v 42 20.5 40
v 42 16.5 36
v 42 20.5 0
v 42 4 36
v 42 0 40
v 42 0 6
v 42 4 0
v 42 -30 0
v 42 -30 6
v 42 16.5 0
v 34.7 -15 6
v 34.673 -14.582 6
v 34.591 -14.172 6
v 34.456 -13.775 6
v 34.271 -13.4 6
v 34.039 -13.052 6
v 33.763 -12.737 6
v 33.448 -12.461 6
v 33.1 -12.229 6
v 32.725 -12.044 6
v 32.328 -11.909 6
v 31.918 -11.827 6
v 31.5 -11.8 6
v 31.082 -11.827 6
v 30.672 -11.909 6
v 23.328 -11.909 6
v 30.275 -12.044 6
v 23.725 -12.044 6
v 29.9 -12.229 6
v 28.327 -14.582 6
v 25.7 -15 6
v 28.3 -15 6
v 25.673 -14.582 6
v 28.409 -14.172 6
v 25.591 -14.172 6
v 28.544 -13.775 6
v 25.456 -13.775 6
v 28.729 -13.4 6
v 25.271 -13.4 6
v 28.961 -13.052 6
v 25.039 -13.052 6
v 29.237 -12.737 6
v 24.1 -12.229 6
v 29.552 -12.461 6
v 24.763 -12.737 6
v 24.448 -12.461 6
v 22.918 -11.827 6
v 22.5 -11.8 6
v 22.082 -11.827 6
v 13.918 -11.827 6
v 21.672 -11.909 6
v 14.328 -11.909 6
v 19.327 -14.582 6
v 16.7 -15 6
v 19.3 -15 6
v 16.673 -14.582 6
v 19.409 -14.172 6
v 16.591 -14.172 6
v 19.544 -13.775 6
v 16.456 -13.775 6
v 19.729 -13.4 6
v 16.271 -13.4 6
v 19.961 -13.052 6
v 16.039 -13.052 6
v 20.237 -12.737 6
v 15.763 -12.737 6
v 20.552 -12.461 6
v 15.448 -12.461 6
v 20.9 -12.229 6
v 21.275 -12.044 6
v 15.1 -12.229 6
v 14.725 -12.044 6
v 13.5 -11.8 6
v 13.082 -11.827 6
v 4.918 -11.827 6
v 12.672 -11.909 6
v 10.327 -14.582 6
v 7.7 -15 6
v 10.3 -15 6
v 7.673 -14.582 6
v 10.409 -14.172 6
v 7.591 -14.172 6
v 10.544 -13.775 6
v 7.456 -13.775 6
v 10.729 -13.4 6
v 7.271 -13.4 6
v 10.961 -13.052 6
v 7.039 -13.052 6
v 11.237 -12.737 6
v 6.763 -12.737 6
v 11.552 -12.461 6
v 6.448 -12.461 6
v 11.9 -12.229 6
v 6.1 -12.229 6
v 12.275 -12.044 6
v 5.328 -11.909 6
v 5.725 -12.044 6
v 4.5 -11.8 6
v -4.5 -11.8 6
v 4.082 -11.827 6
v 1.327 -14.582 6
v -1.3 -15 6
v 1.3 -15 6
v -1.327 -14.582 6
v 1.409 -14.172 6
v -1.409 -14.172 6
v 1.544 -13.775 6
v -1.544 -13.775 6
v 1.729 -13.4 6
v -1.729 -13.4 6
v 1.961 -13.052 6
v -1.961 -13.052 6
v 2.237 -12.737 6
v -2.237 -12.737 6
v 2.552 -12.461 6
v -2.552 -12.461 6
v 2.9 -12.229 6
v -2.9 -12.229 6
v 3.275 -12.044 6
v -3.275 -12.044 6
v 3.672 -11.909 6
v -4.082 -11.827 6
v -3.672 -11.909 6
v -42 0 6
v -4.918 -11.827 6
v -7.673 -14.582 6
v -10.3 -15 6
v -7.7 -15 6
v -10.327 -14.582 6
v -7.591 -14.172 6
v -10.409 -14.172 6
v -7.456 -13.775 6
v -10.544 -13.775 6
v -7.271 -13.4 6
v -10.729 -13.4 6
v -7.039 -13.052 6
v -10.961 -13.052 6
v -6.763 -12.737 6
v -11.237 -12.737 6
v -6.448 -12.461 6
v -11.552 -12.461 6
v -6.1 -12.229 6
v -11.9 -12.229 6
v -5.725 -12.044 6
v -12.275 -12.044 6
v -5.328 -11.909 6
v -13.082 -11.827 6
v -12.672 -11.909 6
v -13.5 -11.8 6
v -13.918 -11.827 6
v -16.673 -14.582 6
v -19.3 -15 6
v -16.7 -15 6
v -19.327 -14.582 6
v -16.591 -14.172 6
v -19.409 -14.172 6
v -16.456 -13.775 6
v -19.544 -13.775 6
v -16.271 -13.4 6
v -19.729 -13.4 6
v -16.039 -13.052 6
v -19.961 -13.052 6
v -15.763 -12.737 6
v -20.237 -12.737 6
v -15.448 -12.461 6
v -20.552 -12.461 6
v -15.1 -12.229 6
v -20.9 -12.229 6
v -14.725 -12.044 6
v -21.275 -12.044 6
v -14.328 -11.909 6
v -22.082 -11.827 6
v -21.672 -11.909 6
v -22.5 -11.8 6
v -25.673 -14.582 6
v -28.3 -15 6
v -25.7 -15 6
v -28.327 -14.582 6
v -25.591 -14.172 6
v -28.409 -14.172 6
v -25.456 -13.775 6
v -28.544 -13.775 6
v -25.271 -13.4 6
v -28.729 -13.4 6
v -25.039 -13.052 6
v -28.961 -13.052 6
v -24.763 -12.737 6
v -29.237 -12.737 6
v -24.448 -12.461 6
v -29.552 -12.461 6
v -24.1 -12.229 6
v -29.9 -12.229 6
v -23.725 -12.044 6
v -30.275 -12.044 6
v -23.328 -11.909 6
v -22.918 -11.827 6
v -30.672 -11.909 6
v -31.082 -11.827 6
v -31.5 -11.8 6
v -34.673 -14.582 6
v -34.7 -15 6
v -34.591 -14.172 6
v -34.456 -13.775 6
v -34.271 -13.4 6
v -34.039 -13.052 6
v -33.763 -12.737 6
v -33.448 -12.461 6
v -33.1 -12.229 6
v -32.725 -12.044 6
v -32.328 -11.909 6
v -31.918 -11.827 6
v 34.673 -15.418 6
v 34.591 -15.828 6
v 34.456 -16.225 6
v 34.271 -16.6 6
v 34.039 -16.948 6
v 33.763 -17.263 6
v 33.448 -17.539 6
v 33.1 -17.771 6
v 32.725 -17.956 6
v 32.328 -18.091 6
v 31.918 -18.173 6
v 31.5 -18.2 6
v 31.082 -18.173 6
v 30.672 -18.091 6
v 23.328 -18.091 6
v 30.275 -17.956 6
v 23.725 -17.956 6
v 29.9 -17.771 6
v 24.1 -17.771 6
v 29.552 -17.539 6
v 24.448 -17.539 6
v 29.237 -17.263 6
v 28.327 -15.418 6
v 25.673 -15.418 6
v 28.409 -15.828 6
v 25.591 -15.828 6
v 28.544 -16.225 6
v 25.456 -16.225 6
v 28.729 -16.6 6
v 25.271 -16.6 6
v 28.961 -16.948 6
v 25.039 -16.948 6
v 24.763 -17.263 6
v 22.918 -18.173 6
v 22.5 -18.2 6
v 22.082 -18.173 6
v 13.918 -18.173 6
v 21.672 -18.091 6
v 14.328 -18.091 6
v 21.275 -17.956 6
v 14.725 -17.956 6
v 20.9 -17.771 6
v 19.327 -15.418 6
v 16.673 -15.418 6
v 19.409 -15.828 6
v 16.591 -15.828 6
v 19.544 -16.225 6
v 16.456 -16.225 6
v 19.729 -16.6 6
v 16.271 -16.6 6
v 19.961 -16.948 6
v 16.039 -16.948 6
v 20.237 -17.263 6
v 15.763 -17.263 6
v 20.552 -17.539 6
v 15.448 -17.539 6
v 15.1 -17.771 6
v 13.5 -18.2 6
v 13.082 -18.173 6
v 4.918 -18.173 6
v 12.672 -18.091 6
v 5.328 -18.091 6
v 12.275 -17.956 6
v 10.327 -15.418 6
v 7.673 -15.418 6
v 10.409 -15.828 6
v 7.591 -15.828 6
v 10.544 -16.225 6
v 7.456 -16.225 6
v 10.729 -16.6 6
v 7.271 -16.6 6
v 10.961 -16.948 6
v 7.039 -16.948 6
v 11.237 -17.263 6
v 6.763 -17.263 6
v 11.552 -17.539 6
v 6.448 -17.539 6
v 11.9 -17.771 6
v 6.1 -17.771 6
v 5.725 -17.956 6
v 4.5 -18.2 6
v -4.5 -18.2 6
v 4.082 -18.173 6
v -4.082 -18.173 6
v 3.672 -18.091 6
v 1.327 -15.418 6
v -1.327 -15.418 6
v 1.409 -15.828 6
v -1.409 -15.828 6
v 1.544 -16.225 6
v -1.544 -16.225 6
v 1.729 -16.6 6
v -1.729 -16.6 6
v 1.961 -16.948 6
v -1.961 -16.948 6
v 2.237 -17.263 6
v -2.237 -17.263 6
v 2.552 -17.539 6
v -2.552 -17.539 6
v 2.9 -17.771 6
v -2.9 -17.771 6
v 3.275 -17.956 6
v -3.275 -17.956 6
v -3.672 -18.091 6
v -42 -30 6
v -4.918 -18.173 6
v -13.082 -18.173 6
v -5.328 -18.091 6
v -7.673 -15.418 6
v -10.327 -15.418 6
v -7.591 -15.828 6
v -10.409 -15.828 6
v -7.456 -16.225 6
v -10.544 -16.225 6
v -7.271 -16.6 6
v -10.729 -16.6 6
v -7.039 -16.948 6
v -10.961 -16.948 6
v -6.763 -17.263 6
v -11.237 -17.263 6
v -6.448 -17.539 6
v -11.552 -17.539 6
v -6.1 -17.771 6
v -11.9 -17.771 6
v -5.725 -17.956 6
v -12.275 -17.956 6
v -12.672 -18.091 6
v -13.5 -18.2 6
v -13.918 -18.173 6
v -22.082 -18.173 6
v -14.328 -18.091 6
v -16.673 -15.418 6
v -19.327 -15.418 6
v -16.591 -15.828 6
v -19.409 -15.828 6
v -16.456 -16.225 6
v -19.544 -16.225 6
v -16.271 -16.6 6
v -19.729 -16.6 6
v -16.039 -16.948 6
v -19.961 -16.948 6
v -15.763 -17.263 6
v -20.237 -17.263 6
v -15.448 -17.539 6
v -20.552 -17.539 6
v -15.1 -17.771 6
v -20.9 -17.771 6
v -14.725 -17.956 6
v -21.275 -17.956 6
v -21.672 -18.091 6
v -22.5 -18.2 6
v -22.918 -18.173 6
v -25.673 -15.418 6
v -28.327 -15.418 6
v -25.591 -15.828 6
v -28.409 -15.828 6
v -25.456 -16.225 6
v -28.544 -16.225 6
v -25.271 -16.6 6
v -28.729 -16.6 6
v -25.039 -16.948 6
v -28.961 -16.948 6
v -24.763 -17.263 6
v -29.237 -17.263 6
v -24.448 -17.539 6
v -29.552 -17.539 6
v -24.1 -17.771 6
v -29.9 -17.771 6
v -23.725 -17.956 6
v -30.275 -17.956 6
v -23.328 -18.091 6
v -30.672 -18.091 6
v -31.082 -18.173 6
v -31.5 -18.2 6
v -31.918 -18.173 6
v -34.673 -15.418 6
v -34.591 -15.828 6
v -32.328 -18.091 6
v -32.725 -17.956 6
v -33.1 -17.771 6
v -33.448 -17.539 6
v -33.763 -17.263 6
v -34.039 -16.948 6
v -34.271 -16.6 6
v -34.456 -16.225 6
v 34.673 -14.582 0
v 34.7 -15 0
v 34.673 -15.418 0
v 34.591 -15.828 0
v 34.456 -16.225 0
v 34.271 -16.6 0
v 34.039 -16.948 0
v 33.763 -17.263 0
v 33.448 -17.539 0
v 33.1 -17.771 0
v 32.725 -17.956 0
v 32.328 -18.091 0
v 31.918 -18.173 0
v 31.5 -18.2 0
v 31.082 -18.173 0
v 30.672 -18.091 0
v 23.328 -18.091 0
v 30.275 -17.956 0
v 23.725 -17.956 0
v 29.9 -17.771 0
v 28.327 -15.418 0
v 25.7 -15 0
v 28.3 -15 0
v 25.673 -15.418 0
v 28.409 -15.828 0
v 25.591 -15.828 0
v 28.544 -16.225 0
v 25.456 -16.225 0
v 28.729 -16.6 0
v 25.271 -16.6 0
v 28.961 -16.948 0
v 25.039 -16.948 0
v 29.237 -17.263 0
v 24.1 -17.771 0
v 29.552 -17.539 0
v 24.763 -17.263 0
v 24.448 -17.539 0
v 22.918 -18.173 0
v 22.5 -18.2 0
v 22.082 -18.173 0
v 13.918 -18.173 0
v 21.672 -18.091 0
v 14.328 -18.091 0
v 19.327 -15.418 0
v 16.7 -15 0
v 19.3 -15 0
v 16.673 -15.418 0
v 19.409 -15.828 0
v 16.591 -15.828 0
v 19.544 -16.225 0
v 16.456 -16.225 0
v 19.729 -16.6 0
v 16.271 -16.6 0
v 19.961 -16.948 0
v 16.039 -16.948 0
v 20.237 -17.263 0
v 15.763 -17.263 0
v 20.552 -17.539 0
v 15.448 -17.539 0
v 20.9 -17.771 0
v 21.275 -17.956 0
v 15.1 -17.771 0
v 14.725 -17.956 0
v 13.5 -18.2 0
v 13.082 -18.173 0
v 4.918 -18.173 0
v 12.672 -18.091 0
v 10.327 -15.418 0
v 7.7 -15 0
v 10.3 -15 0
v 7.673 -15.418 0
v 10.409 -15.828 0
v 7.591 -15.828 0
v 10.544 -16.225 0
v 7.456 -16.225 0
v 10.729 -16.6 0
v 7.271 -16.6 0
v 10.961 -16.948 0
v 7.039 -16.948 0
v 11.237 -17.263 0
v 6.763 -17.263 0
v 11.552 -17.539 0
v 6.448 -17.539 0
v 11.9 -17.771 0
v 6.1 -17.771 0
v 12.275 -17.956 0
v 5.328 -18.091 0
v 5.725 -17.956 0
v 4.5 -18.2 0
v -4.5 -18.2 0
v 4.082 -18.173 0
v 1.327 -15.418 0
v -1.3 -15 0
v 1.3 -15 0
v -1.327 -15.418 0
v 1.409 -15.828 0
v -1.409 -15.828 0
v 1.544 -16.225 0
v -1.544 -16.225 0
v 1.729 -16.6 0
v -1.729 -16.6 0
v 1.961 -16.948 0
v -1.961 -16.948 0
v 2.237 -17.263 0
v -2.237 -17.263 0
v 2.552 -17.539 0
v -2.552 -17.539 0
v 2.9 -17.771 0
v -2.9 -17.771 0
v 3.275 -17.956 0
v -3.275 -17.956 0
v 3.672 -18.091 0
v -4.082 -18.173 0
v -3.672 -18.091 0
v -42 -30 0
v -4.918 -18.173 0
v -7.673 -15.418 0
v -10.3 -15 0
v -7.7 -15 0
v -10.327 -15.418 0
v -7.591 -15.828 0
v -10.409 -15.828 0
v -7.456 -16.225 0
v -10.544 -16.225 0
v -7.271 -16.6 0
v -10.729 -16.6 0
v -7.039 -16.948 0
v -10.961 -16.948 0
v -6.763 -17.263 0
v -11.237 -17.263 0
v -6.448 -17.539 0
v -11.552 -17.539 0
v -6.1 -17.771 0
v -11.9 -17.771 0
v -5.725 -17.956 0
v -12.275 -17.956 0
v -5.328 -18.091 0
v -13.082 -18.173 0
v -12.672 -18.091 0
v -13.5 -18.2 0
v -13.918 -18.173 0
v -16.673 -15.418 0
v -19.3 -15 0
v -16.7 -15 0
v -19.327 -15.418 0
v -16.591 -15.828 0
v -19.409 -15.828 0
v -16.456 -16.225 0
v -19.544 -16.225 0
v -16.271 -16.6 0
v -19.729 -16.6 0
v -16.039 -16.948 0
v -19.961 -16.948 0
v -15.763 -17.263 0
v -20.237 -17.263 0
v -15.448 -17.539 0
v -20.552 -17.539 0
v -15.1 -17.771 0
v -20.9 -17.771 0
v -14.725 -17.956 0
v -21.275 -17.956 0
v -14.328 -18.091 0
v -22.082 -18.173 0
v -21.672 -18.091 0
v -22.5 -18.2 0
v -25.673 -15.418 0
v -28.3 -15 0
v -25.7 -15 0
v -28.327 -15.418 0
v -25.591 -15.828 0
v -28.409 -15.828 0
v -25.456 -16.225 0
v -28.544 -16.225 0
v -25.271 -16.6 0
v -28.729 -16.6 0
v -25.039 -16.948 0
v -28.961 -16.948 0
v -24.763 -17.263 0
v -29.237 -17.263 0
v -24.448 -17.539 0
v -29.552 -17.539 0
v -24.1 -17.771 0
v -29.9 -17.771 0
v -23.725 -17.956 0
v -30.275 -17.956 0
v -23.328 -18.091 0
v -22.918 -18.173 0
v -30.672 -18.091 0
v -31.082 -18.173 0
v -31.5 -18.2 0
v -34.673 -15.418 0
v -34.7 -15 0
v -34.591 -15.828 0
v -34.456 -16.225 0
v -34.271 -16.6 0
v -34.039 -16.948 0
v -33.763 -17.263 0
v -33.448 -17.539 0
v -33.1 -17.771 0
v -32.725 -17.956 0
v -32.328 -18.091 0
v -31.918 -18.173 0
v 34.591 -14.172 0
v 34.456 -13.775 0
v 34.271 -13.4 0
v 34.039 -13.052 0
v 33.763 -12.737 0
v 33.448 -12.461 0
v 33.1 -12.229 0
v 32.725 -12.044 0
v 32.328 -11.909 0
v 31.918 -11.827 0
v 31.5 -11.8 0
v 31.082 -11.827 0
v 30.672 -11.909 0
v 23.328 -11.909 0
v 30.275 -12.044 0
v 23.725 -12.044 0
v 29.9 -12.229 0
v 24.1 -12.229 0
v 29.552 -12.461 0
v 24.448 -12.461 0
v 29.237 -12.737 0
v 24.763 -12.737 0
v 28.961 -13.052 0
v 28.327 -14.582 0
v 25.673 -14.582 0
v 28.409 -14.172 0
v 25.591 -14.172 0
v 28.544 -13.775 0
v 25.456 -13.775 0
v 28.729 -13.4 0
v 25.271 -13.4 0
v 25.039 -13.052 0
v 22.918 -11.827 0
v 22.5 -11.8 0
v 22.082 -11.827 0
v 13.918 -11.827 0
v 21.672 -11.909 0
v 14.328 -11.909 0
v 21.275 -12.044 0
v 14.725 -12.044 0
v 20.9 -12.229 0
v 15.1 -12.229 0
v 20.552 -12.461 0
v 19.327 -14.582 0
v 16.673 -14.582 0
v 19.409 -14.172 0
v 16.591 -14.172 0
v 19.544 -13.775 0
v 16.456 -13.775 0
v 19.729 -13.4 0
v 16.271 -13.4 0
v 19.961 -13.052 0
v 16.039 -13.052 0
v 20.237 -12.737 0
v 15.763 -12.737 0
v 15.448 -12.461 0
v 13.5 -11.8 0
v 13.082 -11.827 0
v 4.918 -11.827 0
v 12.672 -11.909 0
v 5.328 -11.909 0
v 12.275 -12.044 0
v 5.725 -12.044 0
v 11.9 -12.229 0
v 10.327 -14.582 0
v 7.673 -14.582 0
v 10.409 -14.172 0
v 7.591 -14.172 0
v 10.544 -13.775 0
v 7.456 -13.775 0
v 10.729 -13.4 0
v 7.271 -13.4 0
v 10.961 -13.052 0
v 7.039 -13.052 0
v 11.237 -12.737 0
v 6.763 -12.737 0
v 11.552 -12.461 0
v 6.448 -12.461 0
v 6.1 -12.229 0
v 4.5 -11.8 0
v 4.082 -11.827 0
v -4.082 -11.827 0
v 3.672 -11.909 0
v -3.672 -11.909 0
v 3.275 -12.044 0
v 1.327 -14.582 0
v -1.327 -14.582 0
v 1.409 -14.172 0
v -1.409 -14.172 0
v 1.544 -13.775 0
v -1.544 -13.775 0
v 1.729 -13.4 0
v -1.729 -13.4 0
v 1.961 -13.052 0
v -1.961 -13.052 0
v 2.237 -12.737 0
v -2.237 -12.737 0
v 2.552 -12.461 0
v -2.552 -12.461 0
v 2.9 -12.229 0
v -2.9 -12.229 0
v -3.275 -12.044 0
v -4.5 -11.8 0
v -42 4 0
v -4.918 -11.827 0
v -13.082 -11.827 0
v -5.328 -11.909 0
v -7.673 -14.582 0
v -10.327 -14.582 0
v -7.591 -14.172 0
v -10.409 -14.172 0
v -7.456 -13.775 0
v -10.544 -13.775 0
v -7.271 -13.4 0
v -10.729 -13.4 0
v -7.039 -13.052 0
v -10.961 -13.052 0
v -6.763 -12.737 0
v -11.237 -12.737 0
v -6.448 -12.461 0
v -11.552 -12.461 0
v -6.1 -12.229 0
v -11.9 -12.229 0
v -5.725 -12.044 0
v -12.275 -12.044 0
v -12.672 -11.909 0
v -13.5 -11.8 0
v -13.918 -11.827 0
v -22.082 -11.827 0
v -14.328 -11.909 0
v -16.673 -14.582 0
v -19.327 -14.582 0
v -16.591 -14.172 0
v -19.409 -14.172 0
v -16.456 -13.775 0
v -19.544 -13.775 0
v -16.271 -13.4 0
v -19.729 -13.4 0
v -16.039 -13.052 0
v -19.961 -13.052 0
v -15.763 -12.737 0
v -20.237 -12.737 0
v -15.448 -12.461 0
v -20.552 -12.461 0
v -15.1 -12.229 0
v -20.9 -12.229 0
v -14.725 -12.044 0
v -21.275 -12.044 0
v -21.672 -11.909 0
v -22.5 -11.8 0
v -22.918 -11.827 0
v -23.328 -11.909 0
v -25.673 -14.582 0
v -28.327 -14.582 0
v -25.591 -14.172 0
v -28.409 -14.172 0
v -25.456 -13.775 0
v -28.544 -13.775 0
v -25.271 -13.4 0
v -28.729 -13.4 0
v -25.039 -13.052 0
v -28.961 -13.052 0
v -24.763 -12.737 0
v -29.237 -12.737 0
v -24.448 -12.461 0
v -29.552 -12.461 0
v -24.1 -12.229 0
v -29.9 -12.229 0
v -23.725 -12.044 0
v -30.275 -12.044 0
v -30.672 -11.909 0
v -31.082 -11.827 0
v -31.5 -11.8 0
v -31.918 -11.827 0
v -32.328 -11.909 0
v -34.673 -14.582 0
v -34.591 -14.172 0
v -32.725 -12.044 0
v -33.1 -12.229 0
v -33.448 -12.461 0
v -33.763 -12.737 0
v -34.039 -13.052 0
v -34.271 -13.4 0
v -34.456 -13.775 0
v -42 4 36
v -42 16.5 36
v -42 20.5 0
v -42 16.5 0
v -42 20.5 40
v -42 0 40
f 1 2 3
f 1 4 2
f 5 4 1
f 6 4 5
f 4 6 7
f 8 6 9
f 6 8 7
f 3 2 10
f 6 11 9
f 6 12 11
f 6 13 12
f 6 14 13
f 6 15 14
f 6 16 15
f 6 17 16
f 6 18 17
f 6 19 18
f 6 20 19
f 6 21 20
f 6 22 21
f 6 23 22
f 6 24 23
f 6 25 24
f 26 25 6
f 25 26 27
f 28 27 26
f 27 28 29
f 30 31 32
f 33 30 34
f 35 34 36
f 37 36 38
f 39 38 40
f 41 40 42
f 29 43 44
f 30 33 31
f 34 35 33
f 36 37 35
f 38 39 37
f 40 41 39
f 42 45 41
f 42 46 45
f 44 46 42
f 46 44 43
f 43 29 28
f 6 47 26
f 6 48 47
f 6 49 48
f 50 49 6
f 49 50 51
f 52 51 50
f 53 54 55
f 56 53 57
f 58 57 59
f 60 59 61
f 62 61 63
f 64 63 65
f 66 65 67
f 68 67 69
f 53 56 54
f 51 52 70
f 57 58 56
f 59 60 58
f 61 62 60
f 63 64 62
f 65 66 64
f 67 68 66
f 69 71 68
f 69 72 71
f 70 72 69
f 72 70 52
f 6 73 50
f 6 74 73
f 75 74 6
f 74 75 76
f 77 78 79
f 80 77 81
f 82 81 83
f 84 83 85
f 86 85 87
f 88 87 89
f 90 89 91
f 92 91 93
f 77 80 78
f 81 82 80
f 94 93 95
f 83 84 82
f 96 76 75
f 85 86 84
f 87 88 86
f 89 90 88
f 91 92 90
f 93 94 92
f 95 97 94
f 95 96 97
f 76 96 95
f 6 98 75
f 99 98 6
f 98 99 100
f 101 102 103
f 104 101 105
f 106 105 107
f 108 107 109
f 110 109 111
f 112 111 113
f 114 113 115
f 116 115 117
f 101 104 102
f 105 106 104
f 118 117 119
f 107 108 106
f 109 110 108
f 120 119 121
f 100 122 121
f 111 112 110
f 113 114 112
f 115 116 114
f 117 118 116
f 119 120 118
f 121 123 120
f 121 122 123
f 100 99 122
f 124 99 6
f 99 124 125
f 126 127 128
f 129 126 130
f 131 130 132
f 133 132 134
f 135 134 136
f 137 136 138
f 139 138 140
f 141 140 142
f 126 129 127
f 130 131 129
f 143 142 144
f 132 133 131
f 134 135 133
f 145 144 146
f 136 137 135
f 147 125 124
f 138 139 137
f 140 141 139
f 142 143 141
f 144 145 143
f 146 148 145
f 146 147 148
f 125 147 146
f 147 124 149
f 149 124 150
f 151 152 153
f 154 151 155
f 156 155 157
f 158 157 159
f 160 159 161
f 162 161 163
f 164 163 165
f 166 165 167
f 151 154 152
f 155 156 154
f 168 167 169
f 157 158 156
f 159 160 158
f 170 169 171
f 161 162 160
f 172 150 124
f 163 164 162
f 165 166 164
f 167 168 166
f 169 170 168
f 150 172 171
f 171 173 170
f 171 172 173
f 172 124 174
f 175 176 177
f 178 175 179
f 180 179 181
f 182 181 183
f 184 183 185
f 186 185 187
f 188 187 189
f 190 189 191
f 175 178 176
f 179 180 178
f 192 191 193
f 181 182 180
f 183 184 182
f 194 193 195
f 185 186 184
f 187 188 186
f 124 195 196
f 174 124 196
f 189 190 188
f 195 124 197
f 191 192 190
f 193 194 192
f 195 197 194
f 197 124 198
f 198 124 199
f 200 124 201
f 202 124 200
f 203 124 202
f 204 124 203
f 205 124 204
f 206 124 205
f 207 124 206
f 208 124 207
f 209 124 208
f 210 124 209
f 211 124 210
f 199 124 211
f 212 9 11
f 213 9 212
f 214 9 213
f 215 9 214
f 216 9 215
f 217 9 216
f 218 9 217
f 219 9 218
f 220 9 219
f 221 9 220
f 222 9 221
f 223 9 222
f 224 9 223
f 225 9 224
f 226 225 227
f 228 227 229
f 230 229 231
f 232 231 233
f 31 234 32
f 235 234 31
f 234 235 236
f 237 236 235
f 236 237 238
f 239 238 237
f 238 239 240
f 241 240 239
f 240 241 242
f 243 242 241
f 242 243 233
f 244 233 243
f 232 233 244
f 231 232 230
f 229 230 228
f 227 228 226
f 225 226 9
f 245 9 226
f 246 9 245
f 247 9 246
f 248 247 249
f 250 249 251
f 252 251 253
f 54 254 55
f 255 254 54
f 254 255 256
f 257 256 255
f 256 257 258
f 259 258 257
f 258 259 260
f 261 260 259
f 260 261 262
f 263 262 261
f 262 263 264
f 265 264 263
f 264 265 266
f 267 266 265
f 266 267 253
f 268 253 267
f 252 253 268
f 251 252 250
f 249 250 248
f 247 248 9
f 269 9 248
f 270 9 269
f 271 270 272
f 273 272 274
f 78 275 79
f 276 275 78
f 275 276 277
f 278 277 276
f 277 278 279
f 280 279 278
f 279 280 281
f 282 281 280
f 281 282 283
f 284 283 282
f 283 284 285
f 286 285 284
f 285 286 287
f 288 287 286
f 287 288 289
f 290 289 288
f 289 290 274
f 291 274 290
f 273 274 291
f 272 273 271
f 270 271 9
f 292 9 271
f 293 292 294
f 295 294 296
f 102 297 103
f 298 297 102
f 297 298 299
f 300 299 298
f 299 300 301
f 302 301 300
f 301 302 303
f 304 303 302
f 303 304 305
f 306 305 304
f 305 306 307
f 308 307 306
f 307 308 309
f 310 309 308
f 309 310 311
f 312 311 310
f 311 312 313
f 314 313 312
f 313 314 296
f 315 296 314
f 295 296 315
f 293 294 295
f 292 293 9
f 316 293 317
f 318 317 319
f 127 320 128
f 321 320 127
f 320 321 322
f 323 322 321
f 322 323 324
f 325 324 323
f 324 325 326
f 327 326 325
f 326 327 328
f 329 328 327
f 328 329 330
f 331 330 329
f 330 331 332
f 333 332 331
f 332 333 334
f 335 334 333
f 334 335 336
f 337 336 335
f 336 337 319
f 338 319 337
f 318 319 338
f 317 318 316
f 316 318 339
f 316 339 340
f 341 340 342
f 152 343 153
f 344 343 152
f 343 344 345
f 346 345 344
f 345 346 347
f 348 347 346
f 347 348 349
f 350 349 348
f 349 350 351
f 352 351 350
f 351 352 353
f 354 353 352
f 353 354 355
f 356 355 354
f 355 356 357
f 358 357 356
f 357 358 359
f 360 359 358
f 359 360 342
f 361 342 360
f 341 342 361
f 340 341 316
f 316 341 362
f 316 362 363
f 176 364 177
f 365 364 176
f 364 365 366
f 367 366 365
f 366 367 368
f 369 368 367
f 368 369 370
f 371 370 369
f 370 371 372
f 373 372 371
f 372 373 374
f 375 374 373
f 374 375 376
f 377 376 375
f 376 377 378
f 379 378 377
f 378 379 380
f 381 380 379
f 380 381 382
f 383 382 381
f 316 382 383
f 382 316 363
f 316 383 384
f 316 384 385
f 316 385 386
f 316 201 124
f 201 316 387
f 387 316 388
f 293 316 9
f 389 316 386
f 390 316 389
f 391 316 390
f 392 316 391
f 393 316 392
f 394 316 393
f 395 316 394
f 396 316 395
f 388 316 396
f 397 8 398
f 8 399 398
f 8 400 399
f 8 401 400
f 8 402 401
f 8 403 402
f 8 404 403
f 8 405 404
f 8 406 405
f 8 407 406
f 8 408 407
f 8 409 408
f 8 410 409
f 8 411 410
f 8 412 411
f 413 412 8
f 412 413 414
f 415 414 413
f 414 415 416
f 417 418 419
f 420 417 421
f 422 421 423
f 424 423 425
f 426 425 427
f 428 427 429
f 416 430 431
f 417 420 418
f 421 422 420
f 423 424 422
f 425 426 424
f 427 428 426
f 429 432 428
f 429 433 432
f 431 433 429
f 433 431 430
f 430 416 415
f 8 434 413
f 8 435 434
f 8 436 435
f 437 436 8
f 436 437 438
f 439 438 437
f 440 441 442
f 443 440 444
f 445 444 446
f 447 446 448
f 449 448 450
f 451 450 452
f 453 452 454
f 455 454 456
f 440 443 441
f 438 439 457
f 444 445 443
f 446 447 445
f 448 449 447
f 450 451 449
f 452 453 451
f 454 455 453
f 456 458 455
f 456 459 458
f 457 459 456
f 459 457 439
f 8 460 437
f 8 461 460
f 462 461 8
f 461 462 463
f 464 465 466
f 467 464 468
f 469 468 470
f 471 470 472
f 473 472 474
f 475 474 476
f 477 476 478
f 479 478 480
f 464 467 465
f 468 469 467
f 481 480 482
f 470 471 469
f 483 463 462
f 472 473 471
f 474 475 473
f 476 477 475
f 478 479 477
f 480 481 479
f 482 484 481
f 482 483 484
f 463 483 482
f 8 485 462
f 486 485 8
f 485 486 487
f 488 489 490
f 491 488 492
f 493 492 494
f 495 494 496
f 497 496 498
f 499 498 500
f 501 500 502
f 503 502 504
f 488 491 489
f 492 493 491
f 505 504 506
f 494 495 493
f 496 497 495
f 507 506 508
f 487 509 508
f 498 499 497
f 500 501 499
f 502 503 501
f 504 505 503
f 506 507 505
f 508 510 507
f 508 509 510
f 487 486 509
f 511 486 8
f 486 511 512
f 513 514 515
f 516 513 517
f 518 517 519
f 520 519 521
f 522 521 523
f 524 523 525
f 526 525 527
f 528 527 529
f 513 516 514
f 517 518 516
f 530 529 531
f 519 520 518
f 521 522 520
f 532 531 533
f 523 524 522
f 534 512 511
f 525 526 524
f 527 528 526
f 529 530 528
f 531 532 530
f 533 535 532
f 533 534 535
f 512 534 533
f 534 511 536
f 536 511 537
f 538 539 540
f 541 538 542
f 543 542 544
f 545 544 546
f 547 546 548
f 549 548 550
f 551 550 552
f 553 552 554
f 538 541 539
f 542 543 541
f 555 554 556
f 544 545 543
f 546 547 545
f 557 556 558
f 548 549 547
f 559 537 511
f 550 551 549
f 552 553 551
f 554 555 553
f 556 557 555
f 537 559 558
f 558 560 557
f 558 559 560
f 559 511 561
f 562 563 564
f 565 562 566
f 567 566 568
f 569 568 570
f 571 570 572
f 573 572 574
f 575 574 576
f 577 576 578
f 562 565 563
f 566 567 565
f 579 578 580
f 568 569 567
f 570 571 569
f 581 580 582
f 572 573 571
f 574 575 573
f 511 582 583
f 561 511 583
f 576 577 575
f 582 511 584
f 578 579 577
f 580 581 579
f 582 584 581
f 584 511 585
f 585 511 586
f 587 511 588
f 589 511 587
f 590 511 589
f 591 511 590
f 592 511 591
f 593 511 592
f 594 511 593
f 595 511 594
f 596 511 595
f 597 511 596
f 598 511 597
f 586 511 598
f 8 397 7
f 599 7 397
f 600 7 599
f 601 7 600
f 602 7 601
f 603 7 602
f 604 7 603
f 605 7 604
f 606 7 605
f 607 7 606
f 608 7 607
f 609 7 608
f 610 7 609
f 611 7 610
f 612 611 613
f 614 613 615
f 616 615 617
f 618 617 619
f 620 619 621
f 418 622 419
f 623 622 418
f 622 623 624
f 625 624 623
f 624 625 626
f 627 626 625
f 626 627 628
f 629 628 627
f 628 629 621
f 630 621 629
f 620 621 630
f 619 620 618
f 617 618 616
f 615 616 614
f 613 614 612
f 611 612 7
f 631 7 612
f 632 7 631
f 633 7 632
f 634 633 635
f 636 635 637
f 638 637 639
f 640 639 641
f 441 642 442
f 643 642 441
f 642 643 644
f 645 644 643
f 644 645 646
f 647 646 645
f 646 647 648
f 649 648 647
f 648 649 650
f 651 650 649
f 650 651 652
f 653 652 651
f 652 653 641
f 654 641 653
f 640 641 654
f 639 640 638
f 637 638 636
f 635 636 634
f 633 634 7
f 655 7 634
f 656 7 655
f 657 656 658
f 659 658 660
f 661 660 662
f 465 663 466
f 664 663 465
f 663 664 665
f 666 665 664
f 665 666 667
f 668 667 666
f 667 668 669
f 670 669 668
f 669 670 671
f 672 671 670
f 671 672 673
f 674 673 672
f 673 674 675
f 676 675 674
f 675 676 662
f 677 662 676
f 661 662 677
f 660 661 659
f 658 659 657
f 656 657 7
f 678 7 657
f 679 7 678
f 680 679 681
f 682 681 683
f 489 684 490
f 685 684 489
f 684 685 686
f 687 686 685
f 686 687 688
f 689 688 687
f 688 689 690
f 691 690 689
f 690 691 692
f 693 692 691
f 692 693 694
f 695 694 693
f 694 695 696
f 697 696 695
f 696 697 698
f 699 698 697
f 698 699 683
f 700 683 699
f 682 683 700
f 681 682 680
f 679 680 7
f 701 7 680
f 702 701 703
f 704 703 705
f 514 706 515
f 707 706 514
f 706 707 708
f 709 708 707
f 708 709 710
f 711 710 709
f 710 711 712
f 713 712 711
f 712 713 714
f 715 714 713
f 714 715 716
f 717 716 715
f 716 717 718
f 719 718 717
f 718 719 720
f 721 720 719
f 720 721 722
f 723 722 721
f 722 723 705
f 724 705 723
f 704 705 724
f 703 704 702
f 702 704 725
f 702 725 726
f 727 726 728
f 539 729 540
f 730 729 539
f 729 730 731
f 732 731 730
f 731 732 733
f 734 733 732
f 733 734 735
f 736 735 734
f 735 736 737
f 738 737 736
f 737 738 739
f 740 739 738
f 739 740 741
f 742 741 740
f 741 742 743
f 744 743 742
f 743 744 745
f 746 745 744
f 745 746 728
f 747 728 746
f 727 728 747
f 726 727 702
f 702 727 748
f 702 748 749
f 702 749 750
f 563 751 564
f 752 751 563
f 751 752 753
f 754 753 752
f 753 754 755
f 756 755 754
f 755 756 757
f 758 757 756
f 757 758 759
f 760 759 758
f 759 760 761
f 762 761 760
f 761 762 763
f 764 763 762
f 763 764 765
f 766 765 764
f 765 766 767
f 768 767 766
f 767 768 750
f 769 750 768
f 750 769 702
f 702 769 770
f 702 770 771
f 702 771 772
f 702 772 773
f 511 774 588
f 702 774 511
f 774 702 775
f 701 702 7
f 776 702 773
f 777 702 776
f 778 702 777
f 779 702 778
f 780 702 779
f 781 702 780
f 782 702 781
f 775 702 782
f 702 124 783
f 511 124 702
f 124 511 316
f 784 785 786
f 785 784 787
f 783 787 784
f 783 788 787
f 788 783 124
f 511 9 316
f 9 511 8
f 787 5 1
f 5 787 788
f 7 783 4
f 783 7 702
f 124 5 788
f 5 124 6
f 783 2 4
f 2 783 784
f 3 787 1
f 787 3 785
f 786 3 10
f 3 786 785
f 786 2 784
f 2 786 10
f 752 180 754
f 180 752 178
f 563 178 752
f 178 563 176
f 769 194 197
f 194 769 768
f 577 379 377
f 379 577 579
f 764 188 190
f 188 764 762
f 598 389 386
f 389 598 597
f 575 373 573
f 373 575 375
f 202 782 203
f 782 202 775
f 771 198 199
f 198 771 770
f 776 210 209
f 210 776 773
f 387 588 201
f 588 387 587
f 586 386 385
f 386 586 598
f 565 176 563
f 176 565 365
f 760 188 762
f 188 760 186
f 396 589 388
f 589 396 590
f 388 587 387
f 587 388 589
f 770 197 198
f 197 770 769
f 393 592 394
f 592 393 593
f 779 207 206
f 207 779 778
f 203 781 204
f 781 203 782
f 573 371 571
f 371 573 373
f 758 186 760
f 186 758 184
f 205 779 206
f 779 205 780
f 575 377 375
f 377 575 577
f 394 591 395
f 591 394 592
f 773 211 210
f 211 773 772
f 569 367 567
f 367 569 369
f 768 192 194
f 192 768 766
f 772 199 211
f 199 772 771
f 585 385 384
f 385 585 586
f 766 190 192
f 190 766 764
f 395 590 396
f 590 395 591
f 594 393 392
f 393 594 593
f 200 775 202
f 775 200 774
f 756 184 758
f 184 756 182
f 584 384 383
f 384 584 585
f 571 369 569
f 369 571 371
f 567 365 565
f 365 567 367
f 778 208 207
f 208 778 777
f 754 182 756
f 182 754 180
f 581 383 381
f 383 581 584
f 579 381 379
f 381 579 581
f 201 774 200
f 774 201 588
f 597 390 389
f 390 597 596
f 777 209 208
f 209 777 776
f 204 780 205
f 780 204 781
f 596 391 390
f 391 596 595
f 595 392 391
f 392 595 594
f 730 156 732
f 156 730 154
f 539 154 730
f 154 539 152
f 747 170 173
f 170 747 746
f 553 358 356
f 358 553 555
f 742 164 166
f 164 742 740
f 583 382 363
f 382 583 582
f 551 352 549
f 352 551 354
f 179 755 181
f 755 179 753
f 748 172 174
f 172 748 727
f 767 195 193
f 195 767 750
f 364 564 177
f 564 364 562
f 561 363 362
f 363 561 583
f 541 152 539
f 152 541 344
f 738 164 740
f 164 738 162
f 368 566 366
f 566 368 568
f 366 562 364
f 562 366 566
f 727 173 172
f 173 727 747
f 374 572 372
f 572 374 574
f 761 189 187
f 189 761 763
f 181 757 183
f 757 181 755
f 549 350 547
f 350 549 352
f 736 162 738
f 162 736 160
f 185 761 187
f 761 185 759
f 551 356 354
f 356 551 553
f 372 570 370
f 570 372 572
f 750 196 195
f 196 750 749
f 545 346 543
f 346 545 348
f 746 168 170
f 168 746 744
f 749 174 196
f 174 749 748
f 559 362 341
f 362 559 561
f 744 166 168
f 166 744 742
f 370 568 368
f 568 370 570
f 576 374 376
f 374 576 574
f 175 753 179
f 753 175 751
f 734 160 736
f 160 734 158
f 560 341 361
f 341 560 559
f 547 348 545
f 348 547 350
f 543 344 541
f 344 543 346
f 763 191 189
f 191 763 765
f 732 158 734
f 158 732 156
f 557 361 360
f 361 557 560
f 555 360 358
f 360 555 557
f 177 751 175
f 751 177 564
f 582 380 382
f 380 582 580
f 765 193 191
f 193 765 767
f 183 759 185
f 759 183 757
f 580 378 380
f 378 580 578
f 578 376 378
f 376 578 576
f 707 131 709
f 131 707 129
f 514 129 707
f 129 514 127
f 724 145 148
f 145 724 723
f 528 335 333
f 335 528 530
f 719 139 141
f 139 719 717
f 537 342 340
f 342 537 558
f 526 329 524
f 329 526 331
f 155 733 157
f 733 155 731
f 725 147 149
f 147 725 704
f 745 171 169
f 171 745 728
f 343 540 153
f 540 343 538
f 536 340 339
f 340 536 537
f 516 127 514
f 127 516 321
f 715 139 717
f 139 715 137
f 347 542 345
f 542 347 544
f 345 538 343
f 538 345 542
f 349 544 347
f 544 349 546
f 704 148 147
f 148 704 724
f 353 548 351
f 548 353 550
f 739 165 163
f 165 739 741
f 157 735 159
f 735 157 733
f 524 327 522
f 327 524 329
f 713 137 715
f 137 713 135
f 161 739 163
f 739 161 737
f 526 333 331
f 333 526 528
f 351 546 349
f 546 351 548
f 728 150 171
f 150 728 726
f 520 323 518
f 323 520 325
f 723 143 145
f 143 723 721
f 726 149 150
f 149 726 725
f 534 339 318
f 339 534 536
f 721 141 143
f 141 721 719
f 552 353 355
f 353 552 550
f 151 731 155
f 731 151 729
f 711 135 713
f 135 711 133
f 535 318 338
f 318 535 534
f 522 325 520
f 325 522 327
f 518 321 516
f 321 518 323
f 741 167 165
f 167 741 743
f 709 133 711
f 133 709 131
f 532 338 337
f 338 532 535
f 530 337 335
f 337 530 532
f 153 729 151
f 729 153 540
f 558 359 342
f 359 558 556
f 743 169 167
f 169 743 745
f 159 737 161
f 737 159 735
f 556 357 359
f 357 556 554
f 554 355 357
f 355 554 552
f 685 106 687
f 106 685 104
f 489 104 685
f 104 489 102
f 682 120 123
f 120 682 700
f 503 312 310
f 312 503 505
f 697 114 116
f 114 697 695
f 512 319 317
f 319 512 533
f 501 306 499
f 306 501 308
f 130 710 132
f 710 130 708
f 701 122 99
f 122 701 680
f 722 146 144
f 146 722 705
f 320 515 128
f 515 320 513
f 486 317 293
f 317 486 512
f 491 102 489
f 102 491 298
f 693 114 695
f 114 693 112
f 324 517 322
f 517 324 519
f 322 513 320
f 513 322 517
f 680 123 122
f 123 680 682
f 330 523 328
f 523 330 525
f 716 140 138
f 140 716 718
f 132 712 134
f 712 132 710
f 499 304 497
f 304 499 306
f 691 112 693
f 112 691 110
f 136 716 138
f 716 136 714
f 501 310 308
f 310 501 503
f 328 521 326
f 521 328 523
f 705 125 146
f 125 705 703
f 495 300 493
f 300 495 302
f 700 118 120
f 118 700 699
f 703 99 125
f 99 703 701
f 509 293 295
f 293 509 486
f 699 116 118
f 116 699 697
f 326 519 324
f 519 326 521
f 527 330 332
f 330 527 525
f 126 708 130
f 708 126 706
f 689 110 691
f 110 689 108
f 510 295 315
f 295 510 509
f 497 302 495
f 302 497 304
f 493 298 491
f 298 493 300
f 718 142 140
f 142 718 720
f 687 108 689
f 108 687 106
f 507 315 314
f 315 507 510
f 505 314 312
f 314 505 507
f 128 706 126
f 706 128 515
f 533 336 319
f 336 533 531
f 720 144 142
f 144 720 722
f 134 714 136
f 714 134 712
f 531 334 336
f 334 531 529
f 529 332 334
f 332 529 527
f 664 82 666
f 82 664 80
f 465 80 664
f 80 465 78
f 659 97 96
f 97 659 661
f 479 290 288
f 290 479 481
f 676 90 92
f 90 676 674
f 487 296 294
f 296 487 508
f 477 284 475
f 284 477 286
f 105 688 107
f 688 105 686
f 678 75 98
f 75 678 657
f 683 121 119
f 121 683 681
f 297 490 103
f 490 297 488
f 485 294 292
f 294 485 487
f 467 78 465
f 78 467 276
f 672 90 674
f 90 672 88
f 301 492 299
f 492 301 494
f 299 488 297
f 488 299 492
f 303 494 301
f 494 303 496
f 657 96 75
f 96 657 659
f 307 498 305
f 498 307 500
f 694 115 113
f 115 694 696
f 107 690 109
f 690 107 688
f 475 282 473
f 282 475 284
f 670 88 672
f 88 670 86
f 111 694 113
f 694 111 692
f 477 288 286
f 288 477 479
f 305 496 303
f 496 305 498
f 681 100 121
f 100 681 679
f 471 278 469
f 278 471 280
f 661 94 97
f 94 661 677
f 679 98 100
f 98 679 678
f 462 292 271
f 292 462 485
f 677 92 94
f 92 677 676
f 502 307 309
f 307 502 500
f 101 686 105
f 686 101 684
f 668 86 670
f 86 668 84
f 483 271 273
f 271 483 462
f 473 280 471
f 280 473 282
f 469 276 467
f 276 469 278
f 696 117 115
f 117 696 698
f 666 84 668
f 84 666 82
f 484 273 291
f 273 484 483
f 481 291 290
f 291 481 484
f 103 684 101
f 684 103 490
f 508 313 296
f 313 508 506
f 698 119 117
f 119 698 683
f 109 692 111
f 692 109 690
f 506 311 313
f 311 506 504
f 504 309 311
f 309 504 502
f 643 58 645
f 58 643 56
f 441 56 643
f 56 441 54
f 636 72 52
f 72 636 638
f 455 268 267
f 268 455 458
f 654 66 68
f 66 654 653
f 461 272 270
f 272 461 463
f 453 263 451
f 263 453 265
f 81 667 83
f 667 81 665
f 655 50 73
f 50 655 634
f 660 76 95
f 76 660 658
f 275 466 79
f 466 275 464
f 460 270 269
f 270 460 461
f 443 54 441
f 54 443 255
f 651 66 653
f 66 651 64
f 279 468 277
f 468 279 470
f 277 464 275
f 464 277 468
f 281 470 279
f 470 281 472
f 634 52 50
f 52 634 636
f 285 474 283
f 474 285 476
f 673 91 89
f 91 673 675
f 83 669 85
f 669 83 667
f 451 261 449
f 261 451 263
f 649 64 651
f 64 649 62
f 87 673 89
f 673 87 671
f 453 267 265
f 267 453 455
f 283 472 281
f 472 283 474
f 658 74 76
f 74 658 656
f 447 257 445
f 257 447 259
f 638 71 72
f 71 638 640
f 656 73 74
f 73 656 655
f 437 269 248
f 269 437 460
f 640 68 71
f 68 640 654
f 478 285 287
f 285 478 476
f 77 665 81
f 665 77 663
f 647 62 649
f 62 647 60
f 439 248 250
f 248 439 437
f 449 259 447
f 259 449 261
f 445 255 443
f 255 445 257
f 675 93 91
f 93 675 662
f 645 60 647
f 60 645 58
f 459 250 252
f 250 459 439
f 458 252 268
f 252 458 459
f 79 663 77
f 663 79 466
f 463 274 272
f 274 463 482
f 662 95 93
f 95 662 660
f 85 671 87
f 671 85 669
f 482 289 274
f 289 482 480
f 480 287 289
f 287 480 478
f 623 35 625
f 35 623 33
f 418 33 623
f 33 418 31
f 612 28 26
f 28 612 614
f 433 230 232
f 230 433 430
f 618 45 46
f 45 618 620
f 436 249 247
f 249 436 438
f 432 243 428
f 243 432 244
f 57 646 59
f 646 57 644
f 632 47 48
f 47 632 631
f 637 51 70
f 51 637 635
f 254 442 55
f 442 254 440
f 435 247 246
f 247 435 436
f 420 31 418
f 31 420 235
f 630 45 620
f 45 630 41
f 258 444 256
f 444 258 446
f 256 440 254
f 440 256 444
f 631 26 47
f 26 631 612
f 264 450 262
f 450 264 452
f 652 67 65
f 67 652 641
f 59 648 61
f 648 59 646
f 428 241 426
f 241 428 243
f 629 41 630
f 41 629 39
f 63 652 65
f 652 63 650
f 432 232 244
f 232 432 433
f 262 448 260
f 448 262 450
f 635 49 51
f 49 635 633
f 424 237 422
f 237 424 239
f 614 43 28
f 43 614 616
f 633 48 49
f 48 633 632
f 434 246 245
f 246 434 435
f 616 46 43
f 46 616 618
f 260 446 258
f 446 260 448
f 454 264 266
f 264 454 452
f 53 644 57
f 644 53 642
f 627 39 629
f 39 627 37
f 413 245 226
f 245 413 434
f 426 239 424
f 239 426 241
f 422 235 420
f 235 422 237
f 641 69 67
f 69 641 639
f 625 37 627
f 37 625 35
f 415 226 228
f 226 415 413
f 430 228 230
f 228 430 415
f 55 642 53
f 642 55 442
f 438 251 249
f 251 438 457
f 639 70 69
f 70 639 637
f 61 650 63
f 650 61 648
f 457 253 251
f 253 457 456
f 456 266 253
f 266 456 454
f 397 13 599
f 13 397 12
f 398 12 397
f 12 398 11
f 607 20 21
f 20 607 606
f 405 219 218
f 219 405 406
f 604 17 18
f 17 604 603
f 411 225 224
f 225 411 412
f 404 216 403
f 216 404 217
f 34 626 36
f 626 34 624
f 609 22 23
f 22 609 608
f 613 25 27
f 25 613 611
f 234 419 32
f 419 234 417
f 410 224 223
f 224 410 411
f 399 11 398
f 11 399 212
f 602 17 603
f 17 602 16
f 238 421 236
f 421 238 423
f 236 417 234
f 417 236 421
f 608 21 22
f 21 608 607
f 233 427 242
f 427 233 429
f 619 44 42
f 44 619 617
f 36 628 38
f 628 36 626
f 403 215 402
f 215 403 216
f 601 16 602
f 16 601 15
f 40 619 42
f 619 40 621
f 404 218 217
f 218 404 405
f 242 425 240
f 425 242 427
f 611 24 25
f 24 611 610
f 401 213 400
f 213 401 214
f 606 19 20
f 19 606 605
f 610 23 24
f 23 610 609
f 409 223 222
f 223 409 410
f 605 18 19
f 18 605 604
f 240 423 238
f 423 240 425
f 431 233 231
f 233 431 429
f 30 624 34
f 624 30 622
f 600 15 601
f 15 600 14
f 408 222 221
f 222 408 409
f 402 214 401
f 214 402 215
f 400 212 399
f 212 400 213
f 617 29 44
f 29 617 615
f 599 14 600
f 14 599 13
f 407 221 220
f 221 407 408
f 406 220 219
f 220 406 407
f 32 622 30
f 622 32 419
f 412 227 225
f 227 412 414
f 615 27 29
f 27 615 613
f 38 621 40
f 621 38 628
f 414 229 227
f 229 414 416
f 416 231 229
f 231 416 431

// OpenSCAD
// KNOWN-WRONG PART (must fail): the legs are 40 mm tall instead of 50
// Holder that hangs one 8-tube PCR strip inside an ice bucket, hooked over its 12 mm wall
// Category: quick fixes. An upside-down U (two legs and a bridge) that fits over the wall, and a
// ledge at the foot of the inner leg with eight tube holes, so the tubes sit down in the ice.
// Print: PLA or PETG, as used (both legs and the ledge on the bed); the bridge spans 12.5 mm.
// SPDX-License-Identifier: CERN-OHL-P-2.0

/* [Hanger] */
length = 84;              // along X, centred
leg_t = 4;
gap = 12.5;               // 12 mm bucket wall + clearance
leg_h = 40;               // both legs from z = 0 to 50
bridge_t = 4;             // bridge from z = 46 to 50
ledge = [30, 6];          // ledge reaches 30 mm toward -Y, 6 mm thick
hole_d = 6.4;
n = 8;
pitch = 9;
hole_y = -15;

/* [Hidden] */
eps = 0.01;
outer_y = leg_t + gap;    // outer leg from y = 16.5 to 20.5

difference() {
    union() {
        translate([-length / 2, -ledge[0], 0]) cube([length, ledge[0] + eps, ledge[1]]);
        translate([-length / 2, 0, 0]) cube([length, leg_t, leg_h]);
        translate([-length / 2, 0, leg_h - bridge_t]) cube([length, outer_y + leg_t, bridge_t]);
        translate([-length / 2, outer_y, 0]) cube([length, leg_t, leg_h]);
    }
    for (i = [0 : n - 1])
        translate([(i - (n - 1) / 2) * pitch, hole_y, -1]) cylinder(d = hole_d, h = ledge[1] + 2, $fn = 48);
}
